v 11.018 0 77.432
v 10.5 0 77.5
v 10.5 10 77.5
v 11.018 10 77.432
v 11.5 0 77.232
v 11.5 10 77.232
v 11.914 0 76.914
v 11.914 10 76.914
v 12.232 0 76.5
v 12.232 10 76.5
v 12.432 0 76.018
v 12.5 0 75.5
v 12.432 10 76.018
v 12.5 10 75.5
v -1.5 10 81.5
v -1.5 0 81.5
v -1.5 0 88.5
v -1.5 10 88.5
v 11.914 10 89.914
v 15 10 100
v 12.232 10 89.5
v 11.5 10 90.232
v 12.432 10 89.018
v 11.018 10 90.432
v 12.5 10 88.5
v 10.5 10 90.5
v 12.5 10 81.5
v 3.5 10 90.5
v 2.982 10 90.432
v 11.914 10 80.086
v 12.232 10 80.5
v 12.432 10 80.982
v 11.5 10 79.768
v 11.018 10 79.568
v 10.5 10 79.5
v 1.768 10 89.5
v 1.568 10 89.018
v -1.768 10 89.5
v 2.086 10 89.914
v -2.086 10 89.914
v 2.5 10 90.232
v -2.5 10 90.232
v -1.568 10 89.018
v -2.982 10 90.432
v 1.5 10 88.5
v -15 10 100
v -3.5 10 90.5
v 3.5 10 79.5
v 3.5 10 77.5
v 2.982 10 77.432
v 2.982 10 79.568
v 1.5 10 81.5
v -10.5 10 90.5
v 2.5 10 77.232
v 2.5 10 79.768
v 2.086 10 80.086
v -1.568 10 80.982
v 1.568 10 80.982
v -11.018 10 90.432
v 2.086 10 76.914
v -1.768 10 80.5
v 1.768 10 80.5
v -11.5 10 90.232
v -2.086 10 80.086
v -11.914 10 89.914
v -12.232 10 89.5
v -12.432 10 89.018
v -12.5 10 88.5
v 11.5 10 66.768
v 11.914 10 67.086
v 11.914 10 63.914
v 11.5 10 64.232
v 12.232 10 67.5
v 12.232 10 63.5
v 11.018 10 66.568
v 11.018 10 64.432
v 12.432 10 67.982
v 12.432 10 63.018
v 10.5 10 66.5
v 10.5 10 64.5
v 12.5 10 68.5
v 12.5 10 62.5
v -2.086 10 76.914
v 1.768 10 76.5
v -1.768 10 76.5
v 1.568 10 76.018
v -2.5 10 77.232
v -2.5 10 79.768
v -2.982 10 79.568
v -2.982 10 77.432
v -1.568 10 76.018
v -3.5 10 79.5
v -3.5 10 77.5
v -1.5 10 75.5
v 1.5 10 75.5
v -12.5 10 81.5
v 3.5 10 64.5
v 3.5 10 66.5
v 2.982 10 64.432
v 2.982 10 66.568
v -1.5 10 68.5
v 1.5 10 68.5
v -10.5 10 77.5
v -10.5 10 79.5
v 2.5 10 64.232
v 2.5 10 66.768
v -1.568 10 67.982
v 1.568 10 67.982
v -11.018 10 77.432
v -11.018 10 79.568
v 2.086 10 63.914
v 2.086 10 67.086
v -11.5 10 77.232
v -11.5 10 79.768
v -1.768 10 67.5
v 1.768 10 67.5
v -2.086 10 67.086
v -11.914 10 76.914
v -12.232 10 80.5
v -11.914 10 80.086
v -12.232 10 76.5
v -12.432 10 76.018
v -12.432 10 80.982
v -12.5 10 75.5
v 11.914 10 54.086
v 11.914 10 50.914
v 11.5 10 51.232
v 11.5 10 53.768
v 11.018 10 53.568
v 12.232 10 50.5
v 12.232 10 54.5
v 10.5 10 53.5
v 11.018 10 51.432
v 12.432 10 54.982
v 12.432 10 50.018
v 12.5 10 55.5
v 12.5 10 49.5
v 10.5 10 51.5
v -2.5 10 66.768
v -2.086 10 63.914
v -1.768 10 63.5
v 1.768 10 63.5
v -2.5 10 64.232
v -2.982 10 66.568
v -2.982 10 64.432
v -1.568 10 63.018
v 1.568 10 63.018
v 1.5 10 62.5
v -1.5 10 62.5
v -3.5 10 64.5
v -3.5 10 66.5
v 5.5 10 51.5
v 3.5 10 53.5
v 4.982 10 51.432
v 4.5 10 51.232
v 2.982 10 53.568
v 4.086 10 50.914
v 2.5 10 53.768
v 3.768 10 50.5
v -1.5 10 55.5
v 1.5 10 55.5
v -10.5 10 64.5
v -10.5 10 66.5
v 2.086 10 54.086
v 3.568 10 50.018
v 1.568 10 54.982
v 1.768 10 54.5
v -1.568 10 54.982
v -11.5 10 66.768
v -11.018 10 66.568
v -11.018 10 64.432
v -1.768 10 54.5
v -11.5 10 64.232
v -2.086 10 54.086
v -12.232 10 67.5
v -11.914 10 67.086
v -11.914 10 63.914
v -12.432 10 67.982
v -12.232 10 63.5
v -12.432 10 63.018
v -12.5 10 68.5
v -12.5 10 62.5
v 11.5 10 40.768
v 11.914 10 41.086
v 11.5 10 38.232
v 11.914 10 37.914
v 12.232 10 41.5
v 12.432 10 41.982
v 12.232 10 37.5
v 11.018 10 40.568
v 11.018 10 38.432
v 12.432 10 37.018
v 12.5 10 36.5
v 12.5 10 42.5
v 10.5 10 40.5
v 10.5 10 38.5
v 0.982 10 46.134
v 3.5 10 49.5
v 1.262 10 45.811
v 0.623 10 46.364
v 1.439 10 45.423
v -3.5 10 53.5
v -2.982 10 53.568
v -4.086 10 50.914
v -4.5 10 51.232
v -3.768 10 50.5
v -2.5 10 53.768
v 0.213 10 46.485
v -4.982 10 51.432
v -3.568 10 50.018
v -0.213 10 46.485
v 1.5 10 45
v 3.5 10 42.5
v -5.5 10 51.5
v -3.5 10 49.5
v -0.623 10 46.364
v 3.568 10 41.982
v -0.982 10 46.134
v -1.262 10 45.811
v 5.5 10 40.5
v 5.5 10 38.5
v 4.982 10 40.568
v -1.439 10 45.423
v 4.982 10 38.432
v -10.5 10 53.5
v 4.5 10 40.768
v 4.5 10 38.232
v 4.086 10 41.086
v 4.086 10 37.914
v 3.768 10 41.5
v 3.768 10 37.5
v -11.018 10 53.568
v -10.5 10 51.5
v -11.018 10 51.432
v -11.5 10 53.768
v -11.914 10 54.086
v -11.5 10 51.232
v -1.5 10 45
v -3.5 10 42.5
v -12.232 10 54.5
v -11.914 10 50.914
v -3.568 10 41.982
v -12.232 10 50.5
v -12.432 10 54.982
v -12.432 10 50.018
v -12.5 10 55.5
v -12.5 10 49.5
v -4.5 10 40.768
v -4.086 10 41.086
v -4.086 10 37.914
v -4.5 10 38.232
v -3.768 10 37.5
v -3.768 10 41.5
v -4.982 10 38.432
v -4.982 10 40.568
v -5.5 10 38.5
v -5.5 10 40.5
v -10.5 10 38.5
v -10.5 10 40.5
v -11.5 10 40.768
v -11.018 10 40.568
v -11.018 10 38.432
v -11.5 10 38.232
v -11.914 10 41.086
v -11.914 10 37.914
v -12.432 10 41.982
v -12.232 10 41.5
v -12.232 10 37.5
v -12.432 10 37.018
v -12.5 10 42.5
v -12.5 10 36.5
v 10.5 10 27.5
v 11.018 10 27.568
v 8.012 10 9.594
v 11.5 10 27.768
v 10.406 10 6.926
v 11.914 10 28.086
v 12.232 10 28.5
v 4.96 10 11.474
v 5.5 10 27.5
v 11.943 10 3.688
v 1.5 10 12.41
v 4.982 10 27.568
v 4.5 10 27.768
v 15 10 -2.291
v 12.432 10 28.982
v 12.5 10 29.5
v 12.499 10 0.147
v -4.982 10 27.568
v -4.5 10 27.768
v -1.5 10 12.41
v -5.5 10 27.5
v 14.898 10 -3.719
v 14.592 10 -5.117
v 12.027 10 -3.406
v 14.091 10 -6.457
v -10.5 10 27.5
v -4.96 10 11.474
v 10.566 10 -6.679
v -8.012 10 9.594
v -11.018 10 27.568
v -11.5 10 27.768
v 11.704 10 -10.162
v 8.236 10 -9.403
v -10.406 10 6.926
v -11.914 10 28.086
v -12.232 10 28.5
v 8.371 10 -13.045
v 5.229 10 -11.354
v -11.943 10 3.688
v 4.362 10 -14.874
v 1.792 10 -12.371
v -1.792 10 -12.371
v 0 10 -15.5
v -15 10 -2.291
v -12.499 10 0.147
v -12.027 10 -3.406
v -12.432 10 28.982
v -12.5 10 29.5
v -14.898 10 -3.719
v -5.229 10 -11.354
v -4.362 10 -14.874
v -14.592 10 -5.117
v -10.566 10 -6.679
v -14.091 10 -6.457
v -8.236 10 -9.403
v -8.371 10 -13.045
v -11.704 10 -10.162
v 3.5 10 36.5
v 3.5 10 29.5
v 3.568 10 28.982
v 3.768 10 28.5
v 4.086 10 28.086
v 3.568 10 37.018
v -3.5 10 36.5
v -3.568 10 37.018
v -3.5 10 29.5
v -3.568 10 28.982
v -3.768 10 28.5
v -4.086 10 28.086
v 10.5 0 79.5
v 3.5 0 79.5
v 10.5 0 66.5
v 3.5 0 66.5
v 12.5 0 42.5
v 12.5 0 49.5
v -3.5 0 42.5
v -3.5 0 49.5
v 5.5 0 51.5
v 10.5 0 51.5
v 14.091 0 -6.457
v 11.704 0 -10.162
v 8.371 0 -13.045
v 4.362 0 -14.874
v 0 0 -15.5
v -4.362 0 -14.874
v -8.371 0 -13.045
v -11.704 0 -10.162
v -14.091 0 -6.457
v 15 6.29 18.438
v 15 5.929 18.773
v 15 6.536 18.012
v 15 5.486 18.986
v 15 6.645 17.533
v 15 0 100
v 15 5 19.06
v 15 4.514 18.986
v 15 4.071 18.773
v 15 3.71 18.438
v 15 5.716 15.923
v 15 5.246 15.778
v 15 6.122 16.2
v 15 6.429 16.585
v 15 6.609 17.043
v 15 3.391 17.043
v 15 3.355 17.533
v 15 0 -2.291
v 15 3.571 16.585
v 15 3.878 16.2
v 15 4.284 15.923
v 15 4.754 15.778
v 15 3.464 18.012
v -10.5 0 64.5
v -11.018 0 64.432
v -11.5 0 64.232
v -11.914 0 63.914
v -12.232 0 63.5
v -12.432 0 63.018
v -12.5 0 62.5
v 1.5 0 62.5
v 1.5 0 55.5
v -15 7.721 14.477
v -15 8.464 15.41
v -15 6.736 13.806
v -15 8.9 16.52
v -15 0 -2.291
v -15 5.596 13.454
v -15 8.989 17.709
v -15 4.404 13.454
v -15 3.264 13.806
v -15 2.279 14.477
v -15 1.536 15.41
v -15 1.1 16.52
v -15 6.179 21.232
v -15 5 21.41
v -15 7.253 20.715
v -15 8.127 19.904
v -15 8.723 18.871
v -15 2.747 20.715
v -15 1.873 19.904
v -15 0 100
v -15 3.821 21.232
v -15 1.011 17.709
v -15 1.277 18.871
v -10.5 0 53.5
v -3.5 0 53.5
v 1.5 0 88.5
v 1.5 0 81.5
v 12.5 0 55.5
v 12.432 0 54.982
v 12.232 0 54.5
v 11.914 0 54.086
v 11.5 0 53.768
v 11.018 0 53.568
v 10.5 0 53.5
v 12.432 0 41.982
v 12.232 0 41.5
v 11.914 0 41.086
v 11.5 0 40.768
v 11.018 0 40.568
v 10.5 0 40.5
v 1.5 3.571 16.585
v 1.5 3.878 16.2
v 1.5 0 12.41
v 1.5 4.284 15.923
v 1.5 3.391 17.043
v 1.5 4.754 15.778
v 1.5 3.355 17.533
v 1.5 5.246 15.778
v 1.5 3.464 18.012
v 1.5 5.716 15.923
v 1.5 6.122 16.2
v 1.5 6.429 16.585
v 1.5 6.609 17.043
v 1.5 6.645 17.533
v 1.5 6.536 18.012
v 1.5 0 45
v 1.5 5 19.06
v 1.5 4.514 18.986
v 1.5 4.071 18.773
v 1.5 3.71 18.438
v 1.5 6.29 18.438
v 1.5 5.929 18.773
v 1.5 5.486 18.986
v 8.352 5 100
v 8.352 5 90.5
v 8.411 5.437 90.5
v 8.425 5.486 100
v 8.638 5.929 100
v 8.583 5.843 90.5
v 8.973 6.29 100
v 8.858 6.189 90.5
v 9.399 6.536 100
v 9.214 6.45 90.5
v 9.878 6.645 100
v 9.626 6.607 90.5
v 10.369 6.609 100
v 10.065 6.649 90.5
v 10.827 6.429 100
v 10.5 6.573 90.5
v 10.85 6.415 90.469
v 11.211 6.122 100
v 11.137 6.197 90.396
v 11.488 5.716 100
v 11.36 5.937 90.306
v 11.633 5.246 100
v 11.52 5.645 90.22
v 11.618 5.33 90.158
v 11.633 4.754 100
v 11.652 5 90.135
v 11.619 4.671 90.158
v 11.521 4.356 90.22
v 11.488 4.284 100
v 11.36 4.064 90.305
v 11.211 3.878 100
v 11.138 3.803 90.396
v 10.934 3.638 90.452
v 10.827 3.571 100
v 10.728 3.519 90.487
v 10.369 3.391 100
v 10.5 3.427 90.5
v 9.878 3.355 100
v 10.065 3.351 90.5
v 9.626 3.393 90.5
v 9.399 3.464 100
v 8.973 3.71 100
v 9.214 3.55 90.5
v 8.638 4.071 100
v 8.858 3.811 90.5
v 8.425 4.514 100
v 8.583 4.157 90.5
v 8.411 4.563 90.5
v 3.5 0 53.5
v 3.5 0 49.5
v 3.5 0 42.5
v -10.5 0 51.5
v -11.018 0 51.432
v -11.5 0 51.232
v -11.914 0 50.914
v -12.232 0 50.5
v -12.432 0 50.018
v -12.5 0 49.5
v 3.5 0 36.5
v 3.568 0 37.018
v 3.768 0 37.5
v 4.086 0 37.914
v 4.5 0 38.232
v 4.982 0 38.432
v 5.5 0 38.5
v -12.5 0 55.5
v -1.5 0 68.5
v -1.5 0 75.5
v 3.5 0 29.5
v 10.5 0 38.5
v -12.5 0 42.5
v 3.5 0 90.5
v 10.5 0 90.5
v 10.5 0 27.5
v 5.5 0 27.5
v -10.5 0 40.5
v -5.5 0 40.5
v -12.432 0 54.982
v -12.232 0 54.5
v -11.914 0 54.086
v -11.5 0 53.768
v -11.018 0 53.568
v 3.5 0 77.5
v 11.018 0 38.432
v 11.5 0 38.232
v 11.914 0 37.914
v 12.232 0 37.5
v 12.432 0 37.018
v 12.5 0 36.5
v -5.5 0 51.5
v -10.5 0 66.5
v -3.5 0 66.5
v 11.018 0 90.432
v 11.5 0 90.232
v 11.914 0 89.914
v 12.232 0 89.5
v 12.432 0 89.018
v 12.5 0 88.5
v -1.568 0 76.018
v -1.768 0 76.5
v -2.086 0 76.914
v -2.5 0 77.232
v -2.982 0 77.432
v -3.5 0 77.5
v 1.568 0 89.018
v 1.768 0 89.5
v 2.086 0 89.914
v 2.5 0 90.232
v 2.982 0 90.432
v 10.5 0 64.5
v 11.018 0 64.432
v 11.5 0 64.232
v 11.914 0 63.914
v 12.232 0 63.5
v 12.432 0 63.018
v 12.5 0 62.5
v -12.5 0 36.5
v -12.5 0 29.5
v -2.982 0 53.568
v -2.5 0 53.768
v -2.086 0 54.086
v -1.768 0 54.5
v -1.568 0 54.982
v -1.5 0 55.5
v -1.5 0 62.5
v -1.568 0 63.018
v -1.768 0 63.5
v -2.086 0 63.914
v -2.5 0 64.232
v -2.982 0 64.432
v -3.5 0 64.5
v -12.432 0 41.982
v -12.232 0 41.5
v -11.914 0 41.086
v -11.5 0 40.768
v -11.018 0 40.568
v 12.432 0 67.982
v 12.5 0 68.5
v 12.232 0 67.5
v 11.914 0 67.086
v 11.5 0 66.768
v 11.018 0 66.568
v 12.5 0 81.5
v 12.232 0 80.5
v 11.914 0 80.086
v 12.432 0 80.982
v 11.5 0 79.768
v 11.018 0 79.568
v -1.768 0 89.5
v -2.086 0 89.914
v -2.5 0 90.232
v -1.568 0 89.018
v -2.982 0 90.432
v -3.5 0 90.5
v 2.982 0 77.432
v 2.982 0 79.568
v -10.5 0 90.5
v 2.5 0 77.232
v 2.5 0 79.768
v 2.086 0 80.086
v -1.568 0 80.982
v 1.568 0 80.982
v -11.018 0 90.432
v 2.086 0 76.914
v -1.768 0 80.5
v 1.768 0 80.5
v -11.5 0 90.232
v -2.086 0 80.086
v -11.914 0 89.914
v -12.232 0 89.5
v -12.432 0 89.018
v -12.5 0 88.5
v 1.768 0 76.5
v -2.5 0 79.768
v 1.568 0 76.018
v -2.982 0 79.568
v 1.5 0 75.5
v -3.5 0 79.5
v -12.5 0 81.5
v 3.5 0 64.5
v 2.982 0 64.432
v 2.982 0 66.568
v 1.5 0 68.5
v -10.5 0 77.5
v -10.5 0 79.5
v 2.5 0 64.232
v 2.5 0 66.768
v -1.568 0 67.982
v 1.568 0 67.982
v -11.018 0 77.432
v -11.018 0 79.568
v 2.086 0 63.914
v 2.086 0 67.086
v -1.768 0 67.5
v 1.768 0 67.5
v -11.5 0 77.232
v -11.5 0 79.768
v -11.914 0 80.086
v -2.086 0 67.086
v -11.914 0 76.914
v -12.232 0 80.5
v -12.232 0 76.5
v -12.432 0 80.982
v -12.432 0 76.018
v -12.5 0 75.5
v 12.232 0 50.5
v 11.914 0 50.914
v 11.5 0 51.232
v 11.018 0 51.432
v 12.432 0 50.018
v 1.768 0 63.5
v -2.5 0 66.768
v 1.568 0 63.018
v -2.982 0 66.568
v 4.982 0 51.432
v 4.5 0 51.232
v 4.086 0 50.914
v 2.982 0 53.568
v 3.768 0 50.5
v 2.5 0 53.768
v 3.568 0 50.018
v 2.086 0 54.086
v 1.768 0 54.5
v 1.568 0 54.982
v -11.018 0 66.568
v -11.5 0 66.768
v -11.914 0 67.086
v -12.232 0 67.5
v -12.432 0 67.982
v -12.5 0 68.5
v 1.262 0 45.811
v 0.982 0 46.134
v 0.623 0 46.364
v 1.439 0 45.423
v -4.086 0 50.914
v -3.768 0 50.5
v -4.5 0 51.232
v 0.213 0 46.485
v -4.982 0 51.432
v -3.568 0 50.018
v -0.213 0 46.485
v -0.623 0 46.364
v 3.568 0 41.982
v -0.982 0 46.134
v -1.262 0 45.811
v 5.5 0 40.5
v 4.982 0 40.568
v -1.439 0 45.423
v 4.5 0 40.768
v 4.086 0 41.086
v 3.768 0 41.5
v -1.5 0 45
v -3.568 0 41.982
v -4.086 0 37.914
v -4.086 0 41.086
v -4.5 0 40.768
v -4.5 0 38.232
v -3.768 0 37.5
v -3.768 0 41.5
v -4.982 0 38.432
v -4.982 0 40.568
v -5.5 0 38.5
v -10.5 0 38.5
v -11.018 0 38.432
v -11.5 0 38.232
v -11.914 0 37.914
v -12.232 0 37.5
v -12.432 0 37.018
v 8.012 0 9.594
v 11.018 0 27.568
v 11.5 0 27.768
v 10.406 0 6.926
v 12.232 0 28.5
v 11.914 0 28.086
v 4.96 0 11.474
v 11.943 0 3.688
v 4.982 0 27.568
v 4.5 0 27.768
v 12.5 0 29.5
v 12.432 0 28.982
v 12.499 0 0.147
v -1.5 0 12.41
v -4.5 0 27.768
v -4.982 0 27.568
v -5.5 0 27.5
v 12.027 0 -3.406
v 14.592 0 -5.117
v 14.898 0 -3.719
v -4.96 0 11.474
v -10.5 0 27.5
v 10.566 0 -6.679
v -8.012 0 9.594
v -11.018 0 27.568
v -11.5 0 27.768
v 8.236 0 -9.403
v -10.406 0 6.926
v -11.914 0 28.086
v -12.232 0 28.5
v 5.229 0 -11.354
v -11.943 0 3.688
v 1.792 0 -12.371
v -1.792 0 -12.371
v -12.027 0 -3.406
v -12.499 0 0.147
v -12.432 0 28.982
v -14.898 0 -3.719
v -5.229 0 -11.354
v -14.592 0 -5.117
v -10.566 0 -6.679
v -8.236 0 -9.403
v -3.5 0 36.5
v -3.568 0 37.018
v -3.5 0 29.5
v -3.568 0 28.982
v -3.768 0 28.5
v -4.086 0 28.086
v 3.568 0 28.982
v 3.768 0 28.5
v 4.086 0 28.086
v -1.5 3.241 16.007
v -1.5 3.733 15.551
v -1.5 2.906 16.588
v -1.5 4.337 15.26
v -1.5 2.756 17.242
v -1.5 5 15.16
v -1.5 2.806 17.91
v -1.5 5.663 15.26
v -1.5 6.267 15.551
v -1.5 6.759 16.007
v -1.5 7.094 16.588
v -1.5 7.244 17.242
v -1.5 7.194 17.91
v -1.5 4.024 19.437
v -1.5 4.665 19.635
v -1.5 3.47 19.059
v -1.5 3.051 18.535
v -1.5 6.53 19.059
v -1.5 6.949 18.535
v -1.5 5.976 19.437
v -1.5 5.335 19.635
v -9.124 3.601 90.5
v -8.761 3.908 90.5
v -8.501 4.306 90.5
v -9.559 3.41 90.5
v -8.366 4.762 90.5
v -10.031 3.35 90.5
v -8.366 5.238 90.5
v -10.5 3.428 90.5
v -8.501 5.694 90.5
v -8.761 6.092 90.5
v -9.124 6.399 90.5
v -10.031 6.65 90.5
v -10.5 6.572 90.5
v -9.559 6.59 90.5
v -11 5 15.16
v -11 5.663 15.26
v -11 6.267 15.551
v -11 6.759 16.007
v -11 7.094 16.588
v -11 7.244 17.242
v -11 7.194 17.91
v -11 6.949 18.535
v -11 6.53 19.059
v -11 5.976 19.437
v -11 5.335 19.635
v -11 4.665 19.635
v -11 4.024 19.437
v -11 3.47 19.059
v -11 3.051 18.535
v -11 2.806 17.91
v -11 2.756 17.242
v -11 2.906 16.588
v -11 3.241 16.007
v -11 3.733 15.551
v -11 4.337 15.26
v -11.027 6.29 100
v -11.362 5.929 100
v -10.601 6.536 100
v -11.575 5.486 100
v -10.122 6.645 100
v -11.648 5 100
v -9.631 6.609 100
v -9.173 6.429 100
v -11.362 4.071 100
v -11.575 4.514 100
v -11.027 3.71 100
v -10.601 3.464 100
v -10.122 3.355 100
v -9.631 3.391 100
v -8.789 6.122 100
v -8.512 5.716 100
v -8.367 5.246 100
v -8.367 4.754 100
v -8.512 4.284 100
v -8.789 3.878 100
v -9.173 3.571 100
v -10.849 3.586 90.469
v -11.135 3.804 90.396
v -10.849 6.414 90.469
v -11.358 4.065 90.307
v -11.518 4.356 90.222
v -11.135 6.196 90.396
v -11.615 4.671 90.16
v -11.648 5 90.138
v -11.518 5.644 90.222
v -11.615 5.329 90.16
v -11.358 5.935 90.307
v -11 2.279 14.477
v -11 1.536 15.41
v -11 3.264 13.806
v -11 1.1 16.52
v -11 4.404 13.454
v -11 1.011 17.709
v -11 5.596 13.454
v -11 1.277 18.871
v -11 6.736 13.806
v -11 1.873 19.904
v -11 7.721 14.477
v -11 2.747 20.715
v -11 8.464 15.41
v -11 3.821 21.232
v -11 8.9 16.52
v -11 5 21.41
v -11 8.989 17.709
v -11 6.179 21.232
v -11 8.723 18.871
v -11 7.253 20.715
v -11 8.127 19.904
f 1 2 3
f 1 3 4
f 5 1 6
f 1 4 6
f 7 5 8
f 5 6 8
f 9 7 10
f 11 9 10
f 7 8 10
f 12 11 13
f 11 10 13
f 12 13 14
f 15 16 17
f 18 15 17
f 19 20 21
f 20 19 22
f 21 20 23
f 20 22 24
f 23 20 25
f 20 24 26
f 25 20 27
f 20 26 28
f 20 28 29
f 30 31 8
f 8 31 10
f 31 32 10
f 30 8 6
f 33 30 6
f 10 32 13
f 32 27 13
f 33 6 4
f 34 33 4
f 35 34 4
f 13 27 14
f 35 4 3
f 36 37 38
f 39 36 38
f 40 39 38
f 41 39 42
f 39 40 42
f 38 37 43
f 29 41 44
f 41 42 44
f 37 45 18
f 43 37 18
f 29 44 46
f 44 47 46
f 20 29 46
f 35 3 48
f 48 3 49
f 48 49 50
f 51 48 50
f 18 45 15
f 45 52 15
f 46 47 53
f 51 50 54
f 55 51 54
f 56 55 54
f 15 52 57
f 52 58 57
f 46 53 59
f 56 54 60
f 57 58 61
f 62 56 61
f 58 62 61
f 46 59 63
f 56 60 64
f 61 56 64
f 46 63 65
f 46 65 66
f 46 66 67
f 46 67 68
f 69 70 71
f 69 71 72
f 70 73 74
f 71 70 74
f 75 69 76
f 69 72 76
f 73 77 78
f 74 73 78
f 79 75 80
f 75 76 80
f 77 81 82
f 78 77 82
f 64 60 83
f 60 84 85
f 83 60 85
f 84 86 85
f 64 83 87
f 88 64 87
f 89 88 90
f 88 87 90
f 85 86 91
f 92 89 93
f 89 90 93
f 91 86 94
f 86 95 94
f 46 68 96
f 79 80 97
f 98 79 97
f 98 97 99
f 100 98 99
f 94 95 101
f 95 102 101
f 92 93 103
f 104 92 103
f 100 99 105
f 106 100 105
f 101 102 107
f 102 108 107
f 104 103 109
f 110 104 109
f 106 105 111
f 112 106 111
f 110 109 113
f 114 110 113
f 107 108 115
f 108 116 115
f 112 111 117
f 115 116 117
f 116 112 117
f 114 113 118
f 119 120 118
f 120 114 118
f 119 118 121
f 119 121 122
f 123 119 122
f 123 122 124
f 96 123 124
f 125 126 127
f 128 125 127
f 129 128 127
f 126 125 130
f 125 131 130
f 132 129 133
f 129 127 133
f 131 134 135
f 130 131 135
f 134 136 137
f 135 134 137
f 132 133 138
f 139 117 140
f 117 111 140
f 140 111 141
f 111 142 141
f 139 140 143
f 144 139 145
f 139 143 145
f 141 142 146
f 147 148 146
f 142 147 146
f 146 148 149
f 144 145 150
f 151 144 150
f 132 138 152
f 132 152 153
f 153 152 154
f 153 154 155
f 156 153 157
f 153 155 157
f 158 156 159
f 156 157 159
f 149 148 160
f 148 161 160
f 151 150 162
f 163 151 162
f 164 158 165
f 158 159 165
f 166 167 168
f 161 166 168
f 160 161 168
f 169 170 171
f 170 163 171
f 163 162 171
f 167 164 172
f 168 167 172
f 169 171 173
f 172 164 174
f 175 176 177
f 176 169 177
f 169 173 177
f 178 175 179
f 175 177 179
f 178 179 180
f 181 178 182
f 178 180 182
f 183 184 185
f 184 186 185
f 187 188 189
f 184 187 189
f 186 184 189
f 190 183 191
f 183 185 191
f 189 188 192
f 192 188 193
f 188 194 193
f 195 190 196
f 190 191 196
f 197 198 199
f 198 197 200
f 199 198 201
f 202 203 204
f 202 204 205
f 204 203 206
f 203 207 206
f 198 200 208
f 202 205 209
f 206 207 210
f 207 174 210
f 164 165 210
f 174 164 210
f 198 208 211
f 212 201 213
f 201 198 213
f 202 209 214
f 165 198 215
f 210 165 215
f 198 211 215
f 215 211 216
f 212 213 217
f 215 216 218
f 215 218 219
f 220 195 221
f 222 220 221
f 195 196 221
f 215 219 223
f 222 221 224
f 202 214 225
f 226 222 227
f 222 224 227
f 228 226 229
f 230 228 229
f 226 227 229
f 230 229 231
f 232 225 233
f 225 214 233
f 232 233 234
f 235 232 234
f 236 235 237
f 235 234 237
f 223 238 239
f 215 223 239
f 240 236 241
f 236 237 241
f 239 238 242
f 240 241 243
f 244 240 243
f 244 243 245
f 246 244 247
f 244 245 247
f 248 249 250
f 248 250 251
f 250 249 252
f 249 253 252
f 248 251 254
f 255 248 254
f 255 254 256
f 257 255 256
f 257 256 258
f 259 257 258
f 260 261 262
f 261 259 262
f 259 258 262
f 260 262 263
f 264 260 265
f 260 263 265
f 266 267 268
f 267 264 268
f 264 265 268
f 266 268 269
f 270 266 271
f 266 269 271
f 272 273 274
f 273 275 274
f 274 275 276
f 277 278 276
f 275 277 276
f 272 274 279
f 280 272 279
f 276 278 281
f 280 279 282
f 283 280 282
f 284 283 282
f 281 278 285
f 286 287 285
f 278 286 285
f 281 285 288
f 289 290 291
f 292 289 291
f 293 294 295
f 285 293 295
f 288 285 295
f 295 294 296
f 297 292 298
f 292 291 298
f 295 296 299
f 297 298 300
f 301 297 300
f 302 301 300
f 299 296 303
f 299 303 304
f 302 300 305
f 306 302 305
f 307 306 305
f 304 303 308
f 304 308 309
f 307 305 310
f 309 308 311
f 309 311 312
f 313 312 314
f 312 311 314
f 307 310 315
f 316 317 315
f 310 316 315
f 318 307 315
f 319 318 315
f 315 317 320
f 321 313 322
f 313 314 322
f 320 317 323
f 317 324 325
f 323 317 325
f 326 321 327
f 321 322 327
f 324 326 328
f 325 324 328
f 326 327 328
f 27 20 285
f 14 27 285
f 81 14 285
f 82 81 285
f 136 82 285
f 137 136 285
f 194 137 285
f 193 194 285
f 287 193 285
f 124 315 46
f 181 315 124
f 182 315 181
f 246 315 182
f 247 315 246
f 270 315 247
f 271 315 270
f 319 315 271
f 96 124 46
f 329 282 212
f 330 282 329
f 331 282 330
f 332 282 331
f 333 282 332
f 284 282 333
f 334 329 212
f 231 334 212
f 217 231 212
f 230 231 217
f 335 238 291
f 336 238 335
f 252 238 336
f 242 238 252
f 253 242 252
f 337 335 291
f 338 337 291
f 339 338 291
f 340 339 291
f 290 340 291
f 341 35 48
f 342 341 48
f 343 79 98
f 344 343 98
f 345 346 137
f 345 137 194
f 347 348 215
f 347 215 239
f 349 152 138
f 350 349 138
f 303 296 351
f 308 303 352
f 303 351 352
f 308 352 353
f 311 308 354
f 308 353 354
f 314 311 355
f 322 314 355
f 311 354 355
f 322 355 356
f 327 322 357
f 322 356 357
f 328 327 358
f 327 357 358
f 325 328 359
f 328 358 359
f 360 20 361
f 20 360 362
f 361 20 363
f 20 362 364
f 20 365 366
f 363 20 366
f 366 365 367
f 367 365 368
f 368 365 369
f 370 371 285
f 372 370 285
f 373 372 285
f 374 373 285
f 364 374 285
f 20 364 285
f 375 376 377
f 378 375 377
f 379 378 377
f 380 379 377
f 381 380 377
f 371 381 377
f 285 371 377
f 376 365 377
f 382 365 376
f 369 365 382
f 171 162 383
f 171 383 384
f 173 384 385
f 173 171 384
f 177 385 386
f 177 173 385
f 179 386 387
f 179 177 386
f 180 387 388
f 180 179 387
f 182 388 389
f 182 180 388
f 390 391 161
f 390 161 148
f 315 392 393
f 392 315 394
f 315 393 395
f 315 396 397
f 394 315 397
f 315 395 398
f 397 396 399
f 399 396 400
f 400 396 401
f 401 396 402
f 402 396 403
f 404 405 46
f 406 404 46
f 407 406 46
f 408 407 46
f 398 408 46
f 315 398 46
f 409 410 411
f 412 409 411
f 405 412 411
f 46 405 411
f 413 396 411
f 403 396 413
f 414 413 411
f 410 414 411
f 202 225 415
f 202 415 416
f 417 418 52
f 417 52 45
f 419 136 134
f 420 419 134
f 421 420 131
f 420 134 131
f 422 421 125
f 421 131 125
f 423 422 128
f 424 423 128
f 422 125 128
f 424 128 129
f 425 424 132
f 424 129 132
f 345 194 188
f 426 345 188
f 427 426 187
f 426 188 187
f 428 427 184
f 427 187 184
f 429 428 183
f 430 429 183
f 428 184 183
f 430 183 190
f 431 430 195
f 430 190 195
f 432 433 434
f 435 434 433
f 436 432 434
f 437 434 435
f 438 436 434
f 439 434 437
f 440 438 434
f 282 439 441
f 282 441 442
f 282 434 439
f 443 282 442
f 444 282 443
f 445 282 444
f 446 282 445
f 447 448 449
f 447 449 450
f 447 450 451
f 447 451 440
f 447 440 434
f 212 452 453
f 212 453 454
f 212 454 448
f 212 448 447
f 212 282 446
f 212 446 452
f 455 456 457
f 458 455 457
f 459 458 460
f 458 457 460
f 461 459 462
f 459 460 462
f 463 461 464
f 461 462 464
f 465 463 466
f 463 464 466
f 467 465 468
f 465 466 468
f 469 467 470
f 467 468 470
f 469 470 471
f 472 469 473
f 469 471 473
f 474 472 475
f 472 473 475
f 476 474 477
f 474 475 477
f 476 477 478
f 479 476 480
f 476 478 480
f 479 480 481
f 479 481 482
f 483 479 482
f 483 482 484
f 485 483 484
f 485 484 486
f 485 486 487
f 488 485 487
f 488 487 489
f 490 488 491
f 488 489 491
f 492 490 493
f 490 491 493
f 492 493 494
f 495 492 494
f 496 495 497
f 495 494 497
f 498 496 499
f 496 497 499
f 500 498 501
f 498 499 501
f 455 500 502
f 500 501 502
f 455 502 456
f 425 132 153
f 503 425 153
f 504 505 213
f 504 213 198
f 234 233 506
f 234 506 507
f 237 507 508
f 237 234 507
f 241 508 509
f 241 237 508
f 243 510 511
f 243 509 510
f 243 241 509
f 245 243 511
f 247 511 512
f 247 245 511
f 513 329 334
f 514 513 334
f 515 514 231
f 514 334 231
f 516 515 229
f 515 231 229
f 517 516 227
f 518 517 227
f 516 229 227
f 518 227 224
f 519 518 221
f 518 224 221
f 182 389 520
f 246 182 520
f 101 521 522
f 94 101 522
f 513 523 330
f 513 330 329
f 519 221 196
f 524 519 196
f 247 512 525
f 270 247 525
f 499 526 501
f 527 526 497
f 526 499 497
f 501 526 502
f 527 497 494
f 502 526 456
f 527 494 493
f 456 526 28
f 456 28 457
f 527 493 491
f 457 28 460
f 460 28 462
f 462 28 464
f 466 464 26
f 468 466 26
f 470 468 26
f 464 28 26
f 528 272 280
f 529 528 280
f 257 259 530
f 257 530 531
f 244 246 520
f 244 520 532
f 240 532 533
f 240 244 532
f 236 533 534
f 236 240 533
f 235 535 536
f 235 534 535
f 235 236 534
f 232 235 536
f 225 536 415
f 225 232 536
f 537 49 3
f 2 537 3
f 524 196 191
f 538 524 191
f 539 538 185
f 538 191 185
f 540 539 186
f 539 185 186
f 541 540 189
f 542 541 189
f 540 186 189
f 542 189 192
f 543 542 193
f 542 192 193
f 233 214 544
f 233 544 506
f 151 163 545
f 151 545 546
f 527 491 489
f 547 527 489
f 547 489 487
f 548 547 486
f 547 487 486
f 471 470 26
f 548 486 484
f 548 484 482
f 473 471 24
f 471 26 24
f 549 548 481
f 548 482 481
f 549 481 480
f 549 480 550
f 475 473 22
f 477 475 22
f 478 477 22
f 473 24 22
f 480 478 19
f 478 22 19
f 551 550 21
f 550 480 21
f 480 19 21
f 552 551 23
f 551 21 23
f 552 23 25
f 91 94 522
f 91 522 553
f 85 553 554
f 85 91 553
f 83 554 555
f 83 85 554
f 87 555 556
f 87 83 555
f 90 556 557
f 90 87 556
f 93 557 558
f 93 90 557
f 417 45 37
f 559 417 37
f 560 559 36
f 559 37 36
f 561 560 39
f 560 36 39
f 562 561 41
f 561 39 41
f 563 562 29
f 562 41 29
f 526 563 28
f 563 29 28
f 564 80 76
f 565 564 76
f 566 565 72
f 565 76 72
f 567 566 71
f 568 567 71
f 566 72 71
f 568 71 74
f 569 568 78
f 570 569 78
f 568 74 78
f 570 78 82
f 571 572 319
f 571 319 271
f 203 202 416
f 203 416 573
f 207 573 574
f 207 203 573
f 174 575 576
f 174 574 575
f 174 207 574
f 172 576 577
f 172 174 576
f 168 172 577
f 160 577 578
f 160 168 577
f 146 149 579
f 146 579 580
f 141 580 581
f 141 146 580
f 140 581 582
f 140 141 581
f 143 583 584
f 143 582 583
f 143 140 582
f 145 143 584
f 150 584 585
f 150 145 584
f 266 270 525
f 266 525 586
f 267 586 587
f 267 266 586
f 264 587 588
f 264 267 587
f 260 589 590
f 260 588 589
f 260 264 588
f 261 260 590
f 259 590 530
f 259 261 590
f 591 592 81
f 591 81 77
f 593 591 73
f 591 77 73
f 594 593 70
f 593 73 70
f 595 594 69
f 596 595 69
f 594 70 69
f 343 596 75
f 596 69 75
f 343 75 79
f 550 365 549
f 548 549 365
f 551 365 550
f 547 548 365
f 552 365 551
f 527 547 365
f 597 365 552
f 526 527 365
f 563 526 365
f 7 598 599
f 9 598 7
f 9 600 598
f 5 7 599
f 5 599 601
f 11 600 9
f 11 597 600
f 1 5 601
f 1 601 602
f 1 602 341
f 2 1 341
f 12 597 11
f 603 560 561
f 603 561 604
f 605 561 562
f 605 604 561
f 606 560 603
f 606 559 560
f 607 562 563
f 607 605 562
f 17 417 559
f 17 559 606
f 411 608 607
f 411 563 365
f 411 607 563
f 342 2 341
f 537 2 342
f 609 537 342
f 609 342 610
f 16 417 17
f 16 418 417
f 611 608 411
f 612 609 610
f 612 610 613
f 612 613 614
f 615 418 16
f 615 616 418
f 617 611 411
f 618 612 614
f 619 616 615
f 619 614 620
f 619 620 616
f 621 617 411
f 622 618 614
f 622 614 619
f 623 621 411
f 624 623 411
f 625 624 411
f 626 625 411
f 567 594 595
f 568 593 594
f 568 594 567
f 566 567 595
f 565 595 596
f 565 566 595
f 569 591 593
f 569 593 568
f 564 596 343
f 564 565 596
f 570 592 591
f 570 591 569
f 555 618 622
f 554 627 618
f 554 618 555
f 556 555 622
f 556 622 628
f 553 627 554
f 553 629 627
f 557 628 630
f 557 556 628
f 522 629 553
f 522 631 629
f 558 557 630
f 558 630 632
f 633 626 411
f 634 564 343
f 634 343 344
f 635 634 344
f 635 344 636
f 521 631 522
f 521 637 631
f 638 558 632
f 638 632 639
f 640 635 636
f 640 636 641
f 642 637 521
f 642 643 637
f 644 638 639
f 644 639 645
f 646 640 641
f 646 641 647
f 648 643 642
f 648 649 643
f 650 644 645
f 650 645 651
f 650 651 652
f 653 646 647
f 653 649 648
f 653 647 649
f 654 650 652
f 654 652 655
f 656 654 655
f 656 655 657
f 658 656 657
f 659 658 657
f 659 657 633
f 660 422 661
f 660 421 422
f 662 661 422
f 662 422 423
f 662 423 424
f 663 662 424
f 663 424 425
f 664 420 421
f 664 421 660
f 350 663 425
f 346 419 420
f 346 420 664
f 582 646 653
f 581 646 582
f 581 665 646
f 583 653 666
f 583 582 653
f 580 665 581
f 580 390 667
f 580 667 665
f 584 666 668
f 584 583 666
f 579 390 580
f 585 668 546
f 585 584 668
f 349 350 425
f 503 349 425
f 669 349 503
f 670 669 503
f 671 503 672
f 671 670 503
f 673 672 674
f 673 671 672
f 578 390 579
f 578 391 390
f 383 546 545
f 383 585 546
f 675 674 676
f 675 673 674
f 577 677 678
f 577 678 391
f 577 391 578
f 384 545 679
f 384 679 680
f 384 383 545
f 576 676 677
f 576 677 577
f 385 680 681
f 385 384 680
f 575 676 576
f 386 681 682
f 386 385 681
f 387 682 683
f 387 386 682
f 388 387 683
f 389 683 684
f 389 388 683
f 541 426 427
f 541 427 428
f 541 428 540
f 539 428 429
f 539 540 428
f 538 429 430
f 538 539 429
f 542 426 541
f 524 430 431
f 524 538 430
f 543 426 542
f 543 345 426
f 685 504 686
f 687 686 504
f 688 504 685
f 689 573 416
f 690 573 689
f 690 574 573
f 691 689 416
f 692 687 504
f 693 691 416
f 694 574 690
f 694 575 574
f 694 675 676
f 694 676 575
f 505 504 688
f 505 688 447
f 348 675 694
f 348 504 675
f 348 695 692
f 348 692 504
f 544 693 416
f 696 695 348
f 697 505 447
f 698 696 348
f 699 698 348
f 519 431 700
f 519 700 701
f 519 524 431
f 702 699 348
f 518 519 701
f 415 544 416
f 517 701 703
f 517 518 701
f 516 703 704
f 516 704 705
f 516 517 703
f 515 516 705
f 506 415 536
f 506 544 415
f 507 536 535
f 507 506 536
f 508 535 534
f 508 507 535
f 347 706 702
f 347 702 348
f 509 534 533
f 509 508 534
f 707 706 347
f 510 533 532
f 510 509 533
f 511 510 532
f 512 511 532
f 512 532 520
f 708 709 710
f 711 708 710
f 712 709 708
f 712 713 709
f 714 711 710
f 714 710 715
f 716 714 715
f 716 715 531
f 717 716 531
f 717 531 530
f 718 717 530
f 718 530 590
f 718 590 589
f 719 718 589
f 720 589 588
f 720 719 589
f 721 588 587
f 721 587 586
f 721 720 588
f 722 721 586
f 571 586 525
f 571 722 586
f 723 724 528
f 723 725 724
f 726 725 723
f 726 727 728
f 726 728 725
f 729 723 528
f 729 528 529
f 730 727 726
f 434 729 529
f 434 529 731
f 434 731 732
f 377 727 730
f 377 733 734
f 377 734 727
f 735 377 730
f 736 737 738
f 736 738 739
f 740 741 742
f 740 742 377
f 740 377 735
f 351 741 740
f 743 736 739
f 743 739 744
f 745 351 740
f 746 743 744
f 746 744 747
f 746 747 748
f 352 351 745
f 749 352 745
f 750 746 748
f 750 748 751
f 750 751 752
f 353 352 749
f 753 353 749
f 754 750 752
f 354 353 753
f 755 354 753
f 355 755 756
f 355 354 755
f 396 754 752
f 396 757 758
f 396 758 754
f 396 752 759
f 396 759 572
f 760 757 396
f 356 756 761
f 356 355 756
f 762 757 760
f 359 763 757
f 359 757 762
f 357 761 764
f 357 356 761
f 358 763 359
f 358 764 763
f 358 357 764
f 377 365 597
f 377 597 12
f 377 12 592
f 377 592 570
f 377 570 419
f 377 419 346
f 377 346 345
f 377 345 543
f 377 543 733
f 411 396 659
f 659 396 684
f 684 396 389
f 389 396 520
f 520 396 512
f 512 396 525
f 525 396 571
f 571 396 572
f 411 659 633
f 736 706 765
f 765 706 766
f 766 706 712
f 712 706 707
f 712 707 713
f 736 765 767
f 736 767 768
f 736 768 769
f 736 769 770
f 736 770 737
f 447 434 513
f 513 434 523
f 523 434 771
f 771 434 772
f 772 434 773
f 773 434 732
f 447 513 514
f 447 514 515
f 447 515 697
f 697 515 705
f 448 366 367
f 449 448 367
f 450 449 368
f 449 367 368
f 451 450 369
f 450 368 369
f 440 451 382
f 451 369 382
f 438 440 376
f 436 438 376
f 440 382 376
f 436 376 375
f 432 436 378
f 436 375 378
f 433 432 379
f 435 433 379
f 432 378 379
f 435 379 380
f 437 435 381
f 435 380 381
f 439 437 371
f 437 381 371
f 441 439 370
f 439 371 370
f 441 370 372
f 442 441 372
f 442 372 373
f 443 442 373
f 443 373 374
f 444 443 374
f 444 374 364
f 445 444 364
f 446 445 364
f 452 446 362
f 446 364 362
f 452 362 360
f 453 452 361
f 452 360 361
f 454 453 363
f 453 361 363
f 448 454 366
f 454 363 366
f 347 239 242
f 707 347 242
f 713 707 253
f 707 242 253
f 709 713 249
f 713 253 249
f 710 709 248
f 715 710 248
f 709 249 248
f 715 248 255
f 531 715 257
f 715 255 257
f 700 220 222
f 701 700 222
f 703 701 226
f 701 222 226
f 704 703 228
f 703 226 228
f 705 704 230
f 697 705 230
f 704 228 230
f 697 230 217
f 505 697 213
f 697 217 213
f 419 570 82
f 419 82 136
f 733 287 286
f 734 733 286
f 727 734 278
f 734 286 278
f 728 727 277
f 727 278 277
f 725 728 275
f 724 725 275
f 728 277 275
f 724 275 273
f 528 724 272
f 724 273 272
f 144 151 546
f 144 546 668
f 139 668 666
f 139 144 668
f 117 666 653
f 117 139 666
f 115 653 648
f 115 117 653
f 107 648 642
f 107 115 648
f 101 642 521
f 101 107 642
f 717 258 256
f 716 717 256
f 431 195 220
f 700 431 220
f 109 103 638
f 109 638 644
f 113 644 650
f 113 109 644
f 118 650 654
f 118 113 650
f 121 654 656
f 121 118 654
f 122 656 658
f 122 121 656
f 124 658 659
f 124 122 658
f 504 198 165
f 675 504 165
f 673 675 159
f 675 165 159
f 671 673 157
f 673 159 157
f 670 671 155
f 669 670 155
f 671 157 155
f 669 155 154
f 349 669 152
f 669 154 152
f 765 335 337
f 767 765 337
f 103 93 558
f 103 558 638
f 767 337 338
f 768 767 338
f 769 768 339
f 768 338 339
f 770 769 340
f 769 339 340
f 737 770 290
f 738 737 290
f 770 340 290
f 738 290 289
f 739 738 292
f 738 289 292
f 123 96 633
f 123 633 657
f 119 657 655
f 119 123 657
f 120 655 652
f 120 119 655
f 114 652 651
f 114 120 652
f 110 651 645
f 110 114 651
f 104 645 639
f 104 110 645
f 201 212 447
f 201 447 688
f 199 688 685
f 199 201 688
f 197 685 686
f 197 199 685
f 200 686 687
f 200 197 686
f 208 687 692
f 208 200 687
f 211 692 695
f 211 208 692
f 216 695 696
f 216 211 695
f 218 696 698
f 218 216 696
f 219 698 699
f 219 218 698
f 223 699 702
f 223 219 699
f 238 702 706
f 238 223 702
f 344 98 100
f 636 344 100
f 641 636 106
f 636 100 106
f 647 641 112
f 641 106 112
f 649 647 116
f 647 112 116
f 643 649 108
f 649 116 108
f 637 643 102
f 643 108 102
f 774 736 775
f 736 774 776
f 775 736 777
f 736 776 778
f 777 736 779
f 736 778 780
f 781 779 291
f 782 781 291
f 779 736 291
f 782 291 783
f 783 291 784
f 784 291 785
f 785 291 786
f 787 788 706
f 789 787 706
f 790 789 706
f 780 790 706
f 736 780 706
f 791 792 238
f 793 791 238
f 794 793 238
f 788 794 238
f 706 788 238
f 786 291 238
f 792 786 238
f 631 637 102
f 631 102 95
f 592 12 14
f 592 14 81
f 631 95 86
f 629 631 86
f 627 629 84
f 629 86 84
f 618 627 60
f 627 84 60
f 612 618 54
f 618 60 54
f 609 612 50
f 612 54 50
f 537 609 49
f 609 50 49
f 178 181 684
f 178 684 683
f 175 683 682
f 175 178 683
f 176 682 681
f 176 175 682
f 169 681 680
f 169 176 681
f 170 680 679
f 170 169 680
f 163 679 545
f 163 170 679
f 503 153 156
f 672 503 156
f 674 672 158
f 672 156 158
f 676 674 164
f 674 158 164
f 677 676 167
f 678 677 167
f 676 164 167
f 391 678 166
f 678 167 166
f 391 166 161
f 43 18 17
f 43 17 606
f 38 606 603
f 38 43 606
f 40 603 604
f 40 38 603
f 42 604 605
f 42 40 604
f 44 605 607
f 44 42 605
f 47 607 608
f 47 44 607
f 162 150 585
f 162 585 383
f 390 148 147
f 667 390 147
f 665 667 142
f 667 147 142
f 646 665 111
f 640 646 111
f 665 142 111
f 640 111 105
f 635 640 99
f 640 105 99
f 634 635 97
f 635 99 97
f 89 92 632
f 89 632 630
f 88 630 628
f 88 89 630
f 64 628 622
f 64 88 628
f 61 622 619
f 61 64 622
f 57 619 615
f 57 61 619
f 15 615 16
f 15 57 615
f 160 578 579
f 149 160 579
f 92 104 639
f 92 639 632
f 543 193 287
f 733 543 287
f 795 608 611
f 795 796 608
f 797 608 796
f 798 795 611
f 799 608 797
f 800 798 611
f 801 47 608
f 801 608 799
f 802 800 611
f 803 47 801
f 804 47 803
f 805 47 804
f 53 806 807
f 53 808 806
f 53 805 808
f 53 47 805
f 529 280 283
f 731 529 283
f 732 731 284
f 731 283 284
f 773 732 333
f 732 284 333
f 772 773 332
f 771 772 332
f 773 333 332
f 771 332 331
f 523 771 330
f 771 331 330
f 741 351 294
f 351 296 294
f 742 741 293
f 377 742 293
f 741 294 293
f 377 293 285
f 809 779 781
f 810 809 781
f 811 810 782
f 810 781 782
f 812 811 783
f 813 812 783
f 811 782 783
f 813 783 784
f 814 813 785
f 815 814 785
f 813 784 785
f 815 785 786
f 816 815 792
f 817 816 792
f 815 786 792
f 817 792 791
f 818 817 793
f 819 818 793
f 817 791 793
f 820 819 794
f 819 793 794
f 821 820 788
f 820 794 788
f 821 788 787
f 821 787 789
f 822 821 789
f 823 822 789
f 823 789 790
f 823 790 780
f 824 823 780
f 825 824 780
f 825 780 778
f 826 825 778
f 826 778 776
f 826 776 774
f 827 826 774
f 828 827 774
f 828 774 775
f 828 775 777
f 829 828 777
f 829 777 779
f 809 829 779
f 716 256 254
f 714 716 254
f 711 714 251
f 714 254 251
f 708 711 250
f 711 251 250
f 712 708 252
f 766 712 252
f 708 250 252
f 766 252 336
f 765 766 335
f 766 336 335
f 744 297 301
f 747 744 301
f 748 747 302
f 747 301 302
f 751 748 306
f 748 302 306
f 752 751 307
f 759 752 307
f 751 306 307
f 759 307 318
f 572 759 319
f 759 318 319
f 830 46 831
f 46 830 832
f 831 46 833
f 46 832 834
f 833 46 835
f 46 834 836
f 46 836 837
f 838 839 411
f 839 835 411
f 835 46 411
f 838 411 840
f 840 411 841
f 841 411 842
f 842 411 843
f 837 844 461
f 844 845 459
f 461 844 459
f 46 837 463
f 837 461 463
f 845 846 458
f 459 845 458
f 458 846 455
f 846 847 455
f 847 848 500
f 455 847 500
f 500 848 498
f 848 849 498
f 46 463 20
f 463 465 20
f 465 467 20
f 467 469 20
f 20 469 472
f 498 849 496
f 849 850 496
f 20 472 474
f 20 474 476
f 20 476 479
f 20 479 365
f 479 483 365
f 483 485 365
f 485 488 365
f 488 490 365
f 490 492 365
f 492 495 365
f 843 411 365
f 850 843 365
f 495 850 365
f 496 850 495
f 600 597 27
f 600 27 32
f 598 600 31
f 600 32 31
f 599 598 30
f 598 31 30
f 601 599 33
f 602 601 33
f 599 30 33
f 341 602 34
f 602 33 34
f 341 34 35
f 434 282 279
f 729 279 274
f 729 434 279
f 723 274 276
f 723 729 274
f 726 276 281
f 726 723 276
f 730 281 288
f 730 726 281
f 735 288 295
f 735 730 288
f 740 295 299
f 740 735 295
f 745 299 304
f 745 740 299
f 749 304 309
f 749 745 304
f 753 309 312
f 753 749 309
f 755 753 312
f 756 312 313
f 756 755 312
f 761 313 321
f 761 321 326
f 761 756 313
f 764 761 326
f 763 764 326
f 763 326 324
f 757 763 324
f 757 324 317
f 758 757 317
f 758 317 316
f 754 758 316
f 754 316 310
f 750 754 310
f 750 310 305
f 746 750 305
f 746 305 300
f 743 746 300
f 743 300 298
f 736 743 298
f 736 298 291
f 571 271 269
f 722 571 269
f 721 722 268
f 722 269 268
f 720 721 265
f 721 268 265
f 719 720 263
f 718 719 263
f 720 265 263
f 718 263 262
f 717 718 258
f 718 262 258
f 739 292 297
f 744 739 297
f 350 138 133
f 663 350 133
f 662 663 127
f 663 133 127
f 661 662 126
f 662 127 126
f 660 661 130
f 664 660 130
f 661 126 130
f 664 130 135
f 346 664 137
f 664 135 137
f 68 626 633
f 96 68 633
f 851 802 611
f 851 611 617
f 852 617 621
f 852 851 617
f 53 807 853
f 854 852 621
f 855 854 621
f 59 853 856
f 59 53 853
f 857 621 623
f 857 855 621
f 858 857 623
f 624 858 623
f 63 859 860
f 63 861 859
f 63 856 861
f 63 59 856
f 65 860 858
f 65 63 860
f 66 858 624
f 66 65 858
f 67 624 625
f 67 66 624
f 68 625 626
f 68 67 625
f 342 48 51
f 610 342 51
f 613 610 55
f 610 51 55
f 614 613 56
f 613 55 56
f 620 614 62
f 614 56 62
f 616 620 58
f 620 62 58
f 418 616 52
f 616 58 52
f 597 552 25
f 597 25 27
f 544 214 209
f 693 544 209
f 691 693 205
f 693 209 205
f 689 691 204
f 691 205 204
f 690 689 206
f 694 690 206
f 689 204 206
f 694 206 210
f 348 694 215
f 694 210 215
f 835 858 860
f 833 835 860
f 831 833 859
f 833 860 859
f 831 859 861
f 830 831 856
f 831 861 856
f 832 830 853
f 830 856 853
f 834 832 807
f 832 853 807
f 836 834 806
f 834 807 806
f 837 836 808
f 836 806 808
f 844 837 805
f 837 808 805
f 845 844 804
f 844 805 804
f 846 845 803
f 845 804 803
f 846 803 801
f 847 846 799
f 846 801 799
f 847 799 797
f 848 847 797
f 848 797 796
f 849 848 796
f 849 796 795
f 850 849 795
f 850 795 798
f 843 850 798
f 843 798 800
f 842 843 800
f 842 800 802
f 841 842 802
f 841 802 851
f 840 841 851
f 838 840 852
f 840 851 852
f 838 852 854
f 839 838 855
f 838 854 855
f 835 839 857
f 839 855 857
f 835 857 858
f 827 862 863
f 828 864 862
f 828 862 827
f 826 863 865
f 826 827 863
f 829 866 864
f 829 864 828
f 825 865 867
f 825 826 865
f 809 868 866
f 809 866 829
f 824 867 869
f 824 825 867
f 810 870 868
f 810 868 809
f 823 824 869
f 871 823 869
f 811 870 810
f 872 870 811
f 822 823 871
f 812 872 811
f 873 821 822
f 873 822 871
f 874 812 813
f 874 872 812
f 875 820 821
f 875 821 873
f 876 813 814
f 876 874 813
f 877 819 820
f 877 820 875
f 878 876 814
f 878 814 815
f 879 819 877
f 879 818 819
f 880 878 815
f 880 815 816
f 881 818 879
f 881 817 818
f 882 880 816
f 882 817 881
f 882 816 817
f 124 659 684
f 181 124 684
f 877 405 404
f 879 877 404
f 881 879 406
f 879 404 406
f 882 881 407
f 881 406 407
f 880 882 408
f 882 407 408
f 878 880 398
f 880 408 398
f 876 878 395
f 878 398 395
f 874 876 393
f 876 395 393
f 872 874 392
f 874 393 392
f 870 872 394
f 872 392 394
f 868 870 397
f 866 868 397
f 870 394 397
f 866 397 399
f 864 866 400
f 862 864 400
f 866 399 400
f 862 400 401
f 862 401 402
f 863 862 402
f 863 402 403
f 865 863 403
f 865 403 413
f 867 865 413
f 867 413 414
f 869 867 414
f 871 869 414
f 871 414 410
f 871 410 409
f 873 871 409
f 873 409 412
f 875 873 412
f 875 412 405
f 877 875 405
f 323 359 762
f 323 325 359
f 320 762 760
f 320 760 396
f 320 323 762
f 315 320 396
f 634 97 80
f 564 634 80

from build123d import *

# Parameters (mm, degrees)
SKETCH_1_R                  = 12.5
EXTRUDE_1_DEPTH             = 10
CUT_EXTRUDE_5_DEPTH         = 102.687019821
SKETCH_8_W                  = 1.65
SKETCH_8_H                  = 14
HOLE_WIZARD_M41_D           = 4.5
HOLE_WIZARD_M41_DEPTH       = 14
HOLE_WIZARD_M41_CBORE_D     = 8
HOLE_WIZARD_M41_CBORE_DEPTH = 4.5
CUT_EXTRUDE_START           = -10
CUT_EXTRUDE_6_DEPTH         = 10
FILLET_1_R                  = 10
M4X0_72_D                   = 3.3
M4X0_72_DEPTH               = 10
M4X0_72_TIP                 = 0.991420021
CUT_EXTRUDE_7_DEPTH         = 102.612007273
EXTRUDE_2_DEPTH             = 10


with BuildPart() as part:
    # Эскиз1 → Бобышка-Вытянуть1 (new body)
    with BuildSketch(Plane(origin=(0, 0, 0), x_dir=(1, 0, 0), z_dir=(0, 1, 0))):
        with BuildLine():
            Line((-15.5, 0), (-15.5, -100))
            Line((-15.5, -100), (15.5, -100))
            Line((15.5, -100), (15.5, 0))
            ThreePointArc((15.5, 0), (0, 15.5), (-15.5, 0))
        make_face()
        with Locations(Location((0, 0, 0), (0, 0, 270))):
            Circle(SKETCH_1_R, mode=Mode.SUBTRACT)
    extrude(amount=EXTRUDE_1_DEPTH)

    # Эскиз6 → Вырез-Вытянуть5 (cut, through all)
    with BuildSketch(Plane(origin=(0, 10, 0), x_dir=(1, 0, 0), z_dir=(0, 1, 0))):
        with BuildLine():
            Line((-1.5, -12.409673646), (-1.5, -26))
            ThreePointArc((-1.5, -26), (0, -27.5), (1.5, -26))
            Line((1.5, -26), (1.5, -12.409673646))
            ThreePointArc((1.5, -12.409673646), (0, -12.5), (-1.5, -12.409673646))
        make_face()
        with BuildLine():
            Line((-1.5, -42.5), (-1.5, -49.5))
            ThreePointArc((-1.5, -49.5), (-2.085786438, -50.914213562), (-3.5, -51.5))
            Line((-3.5, -51.5), (-10.5, -51.5))
            ThreePointArc((-10.5, -51.5), (-11.914213562, -50.914213562), (-12.5, -49.5))
            Line((-12.5, -49.5), (-12.5, -42.5))
            ThreePointArc((-12.5, -42.5), (-11.914213562, -41.085786438), (-10.5, -40.5))
            Line((-10.5, -40.5), (-3.5, -40.5))
            ThreePointArc((-3.5, -40.5), (-2.085786438, -41.085786438), (-1.5, -42.5))
        make_face()
        with BuildLine():
            Line((-1.5, -55.5), (-1.5, -62.5))
            ThreePointArc((-1.5, -62.5), (-2.085786438, -63.914213562), (-3.5, -64.5))
            Line((-3.5, -64.5), (-10.5, -64.5))
            ThreePointArc((-10.5, -64.5), (-11.914213562, -63.914213562), (-12.5, -62.5))
            Line((-12.5, -62.5), (-12.5, -55.5))
            ThreePointArc((-12.5, -55.5), (-11.914213562, -54.085786438), (-10.5, -53.5))
            Line((-10.5, -53.5), (-3.5, -53.5))
            ThreePointArc((-3.5, -53.5), (-2.085786438, -54.085786438), (-1.5, -55.5))
        make_face()
        with BuildLine():
            Line((-1.5, -68.5), (-1.5, -75.5))
            ThreePointArc((-1.5, -75.5), (-2.085786438, -76.914213562), (-3.5, -77.5))
            Line((-3.5, -77.5), (-10.5, -77.5))
            ThreePointArc((-10.5, -77.5), (-11.914213562, -76.914213562), (-12.5, -75.5))
            Line((-12.5, -75.5), (-12.5, -68.5))
            ThreePointArc((-12.5, -68.5), (-11.914213562, -67.085786438), (-10.5, -66.5))
            Line((-10.5, -66.5), (-3.5, -66.5))
            ThreePointArc((-3.5, -66.5), (-2.085786438, -67.085786438), (-1.5, -68.5))
        make_face()
        with BuildLine():
            Line((-1.5, -81.5), (-1.5, -88.5))
            ThreePointArc((-1.5, -88.5), (-2.085786438, -89.914213562), (-3.5, -90.5))
            Line((-3.5, -90.5), (-10.5, -90.5))
            ThreePointArc((-10.5, -90.5), (-11.914213562, -89.914213562), (-12.5, -88.5))
            Line((-12.5, -88.5), (-12.5, -81.5))
            ThreePointArc((-12.5, -81.5), (-11.914213562, -80.085786438), (-10.5, -79.5))
            Line((-10.5, -79.5), (-3.5, -79.5))
            ThreePointArc((-3.5, -79.5), (-2.085786438, -80.085786438), (-1.5, -81.5))
        make_face()
        with BuildLine():
            Line((1.5, -29.5), (1.5, -36.5))
            ThreePointArc((1.5, -36.5), (2.085786438, -37.914213562), (3.5, -38.5))
            Line((3.5, -38.5), (10.5, -38.5))
            ThreePointArc((10.5, -38.5), (11.914213562, -37.914213562), (12.5, -36.5))
            Line((12.5, -36.5), (12.5, -29.5))
            ThreePointArc((12.5, -29.5), (11.914213562, -28.085786438), (10.5, -27.5))
            Line((10.5, -27.5), (3.5, -27.5))
            ThreePointArc((3.5, -27.5), (2.085786438, -28.085786438), (1.5, -29.5))
        make_face()
        with BuildLine():
            Line((-12.5, -29.5), (-12.5, -36.5))
            ThreePointArc((-12.5, -36.5), (-11.914213562, -37.914213562), (-10.5, -38.5))
            Line((-10.5, -38.5), (-3.5, -38.5))
            ThreePointArc((-3.5, -38.5), (-2.085786438, -37.914213562), (-1.5, -36.5))
            Line((-1.5, -36.5), (-1.5, -29.5))
            ThreePointArc((-1.5, -29.5), (-2.085786438, -28.085786438), (-3.5, -27.5))
            Line((-3.5, -27.5), (-10.5, -27.5))
            ThreePointArc((-10.5, -27.5), (-11.914213562, -28.085786438), (-12.5, -29.5))
        make_face()
        with BuildLine():
            Line((10.5, -79.5), (3.5, -79.5))
            ThreePointArc((3.5, -79.5), (2.085786438, -80.085786438), (1.5, -81.5))
            Line((1.5, -81.5), (1.5, -88.5))
            ThreePointArc((1.5, -88.5), (2.085786438, -89.914213562), (3.5, -90.5))
            Line((3.5, -90.5), (10.5, -90.5))
            ThreePointArc((10.5, -90.5), (11.914213562, -89.914213562), (12.5, -88.5))
            Line((12.5, -88.5), (12.5, -81.5))
            ThreePointArc((12.5, -81.5), (11.914213562, -80.085786438), (10.5, -79.5))
        make_face()
        with BuildLine():
            Line((10.5, -66.5), (3.5, -66.5))
            ThreePointArc((3.5, -66.5), (2.085786438, -67.085786438), (1.5, -68.5))
            Line((1.5, -68.5), (1.5, -75.5))
            ThreePointArc((1.5, -75.5), (2.085786438, -76.914213562), (3.5, -77.5))
            Line((3.5, -77.5), (10.5, -77.5))
            ThreePointArc((10.5, -77.5), (11.914213562, -76.914213562), (12.5, -75.5))
            Line((12.5, -75.5), (12.5, -68.5))
            ThreePointArc((12.5, -68.5), (11.914213562, -67.085786438), (10.5, -66.5))
        make_face()
        with BuildLine():
            Line((10.5, -53.5), (3.5, -53.5))
            ThreePointArc((3.5, -53.5), (2.085786438, -54.085786438), (1.5, -55.5))
            Line((1.5, -55.5), (1.5, -62.5))
            ThreePointArc((1.5, -62.5), (2.085786438, -63.914213562), (3.5, -64.5))
            Line((3.5, -64.5), (10.5, -64.5))
            ThreePointArc((10.5, -64.5), (11.914213562, -63.914213562), (12.5, -62.5))
            Line((12.5, -62.5), (12.5, -55.5))
            ThreePointArc((12.5, -55.5), (11.914213562, -54.085786438), (10.5, -53.5))
        make_face()
        with BuildLine():
            Line((10.5, -40.5), (3.5, -40.5))
            ThreePointArc((3.5, -40.5), (2.085786438, -41.085786438), (1.5, -42.5))
            Line((1.5, -42.5), (1.5, -49.5))
            ThreePointArc((1.5, -49.5), (2.085786438, -50.914213562), (3.5, -51.5))
            Line((3.5, -51.5), (10.5, -51.5))
            ThreePointArc((10.5, -51.5), (11.914213562, -50.914213562), (12.5, -49.5))
            Line((12.5, -49.5), (12.5, -42.5))
            ThreePointArc((12.5, -42.5), (11.914213562, -41.085786438), (10.5, -40.5))
        make_face()
    extrude(amount=-CUT_EXTRUDE_5_DEPTH, mode=Mode.SUBTRACT)

    # Эскиз8 → Отверстие обработанное метчиком M4x0.71 (revolve, cut)
    with BuildSketch(Plane(origin=(1.5, 5, 17.409673646), x_dir=(0, 0, 1), z_dir=(0, 1, 0))):
        with Locations((0.825, 7)):
            Rectangle(SKETCH_8_W, SKETCH_8_H)
    revolve(axis=Axis((-4.85, 5, 17.409673646), (1, 0, 0)), mode=Mode.SUBTRACT)

    # Цековка для винта с внутренним шестигранником M41
    with Locations(Plane.ZY.offset(15.5)):
        with Locations((17.409673646, 5)):
            CounterBoreHole(HOLE_WIZARD_M41_D / 2, HOLE_WIZARD_M41_CBORE_D / 2, HOLE_WIZARD_M41_CBORE_DEPTH, depth=HOLE_WIZARD_M41_DEPTH)

    # Эскиз12 → Вырез-Вытянуть6 (cut)
    with BuildSketch(Plane(origin=(0, 10, 0), x_dir=(1, 0, 0), z_dir=(0, 1, 0)).offset(CUT_EXTRUDE_START)):
        with BuildLine():
            Line((-15, 3.905124838), (-15, -100))
            Line((-15, -100), (-15.5, -100))
            Line((-15.5, -100), (-15.5, 0))
            ThreePointArc((-15.5, 0), (-15.374491862, 1.968501969), (-15, 3.905124838))
        make_face()
        with BuildLine():
            Line((15, -100), (15, 3.905124838))
            ThreePointArc((15, 3.905124838), (15.374491862, 1.968501969), (15.5, 0))
            Line((15.5, 0), (15.5, -100))
            Line((15.5, -100), (15, -100))
        make_face()
    extrude(amount=CUT_EXTRUDE_6_DEPTH, mode=Mode.SUBTRACT)

    # Скругление1
    fillet_1_edges = [part.edges().sort_by_distance(p)[0] for p in [
        (15, 5, -3.905124838),
        (-15, 5, -3.905124838),
    ]]
    fillet(fillet_1_edges, radius=FILLET_1_R)

    # Отверстие обработанное метчиком M4x0.72
    with Locations(Plane.XY.offset(100)):
        with Locations((-9.998288453, 5), (10.001711547, 5)):
            Hole(M4X0_72_D / 2, depth=M4X0_72_DEPTH)
            with Locations((0, 0, -(M4X0_72_DEPTH + M4X0_72_TIP / 2))):  # 118° drill point
                Cone(0, M4X0_72_D / 2, M4X0_72_TIP, mode=Mode.SUBTRACT)

    # Эскиз16 → Вырез-Вытянуть7 (cut, through all)
    with BuildSketch(Plane(origin=(0, 10, 0), x_dir=(1, 0, 0), z_dir=(0, 1, 0))):
        with BuildLine():
            Line((1.5, -26), (1.5, -45))
            ThreePointArc((1.5, -45), (0, -46.5), (-1.5, -45))
            Line((-1.5, -45), (-1.5, -26))
            ThreePointArc((-1.5, -26), (0, -24.5), (1.5, -26))
        make_face()
    extrude(amount=-CUT_EXTRUDE_7_DEPTH, mode=Mode.SUBTRACT)

    # Эскиз17 → Бобышка-Вытянуть2 (add, through all)
    with BuildSketch(Plane(origin=(0, 10, 0), x_dir=(1, 0, 0), z_dir=(0, 1, 0))):
        with BuildLine():
            Line((-1.5, -29.5), (-1.5, -36.5))
            ThreePointArc((-1.5, -36.5), (-2.085786438, -37.914213562), (-3.5, -38.5))
            Line((-3.5, -38.5), (-5.5, -38.5))
            ThreePointArc((-5.5, -38.5), (-4.085786438, -37.914213562), (-3.5, -36.5))
            Line((-3.5, -36.5), (-3.5, -29.5))
            ThreePointArc((-3.5, -29.5), (-4.085786438, -28.085786438), (-5.5, -27.5))
            Line((-5.5, -27.5), (-3.5, -27.5))
            ThreePointArc((-3.5, -27.5), (-2.085786438, -28.085786438), (-1.5, -29.5))
        make_face()
        with BuildLine():
            Line((-1.5, -42.5), (-1.5, -49.5))
            ThreePointArc((-1.5, -49.5), (-2.085786438, -50.914213562), (-3.5, -51.5))
            Line((-3.5, -51.5), (-5.5, -51.5))
            ThreePointArc((-5.5, -51.5), (-4.085786438, -50.914213562), (-3.5, -49.5))
            Line((-3.5, -49.5), (-3.5, -42.5))
            ThreePointArc((-3.5, -42.5), (-4.085786438, -41.085786438), (-5.5, -40.5))
            Line((-5.5, -40.5), (-3.5, -40.5))
            ThreePointArc((-3.5, -40.5), (-2.085786438, -41.085786438), (-1.5, -42.5))
        make_face()
        with BuildLine():
            Line((5.5, -51.5), (3.5, -51.5))
            ThreePointArc((3.5, -51.5), (2.085786438, -50.914213562), (1.5, -49.5))
            Line((1.5, -49.5), (1.5, -42.5))
            ThreePointArc((1.5, -42.5), (2.085786438, -41.085786438), (3.5, -40.5))
            Line((3.5, -40.5), (5.5, -40.5))
            ThreePointArc((5.5, -40.5), (4.085786438, -41.085786438), (3.5, -42.5))
            Line((3.5, -42.5), (3.5, -49.5))
            ThreePointArc((3.5, -49.5), (4.085786438, -50.914213562), (5.5, -51.5))
        make_face()
        with BuildLine():
            Line((5.5, -38.5), (3.5, -38.5))
            ThreePointArc((3.5, -38.5), (2.085786438, -37.914213562), (1.5, -36.5))
            Line((1.5, -36.5), (1.5, -29.5))
            ThreePointArc((1.5, -29.5), (2.085786438, -28.085786438), (3.5, -27.5))
            Line((3.5, -27.5), (5.5, -27.5))
            ThreePointArc((5.5, -27.5), (4.085786438, -28.085786438), (3.5, -29.5))
            Line((3.5, -29.5), (3.5, -36.5))
            ThreePointArc((3.5, -36.5), (4.085786438, -37.914213562), (5.5, -38.5))
        make_face()
    extrude(amount=-EXTRUDE_2_DEPTH)


solid = part.part
